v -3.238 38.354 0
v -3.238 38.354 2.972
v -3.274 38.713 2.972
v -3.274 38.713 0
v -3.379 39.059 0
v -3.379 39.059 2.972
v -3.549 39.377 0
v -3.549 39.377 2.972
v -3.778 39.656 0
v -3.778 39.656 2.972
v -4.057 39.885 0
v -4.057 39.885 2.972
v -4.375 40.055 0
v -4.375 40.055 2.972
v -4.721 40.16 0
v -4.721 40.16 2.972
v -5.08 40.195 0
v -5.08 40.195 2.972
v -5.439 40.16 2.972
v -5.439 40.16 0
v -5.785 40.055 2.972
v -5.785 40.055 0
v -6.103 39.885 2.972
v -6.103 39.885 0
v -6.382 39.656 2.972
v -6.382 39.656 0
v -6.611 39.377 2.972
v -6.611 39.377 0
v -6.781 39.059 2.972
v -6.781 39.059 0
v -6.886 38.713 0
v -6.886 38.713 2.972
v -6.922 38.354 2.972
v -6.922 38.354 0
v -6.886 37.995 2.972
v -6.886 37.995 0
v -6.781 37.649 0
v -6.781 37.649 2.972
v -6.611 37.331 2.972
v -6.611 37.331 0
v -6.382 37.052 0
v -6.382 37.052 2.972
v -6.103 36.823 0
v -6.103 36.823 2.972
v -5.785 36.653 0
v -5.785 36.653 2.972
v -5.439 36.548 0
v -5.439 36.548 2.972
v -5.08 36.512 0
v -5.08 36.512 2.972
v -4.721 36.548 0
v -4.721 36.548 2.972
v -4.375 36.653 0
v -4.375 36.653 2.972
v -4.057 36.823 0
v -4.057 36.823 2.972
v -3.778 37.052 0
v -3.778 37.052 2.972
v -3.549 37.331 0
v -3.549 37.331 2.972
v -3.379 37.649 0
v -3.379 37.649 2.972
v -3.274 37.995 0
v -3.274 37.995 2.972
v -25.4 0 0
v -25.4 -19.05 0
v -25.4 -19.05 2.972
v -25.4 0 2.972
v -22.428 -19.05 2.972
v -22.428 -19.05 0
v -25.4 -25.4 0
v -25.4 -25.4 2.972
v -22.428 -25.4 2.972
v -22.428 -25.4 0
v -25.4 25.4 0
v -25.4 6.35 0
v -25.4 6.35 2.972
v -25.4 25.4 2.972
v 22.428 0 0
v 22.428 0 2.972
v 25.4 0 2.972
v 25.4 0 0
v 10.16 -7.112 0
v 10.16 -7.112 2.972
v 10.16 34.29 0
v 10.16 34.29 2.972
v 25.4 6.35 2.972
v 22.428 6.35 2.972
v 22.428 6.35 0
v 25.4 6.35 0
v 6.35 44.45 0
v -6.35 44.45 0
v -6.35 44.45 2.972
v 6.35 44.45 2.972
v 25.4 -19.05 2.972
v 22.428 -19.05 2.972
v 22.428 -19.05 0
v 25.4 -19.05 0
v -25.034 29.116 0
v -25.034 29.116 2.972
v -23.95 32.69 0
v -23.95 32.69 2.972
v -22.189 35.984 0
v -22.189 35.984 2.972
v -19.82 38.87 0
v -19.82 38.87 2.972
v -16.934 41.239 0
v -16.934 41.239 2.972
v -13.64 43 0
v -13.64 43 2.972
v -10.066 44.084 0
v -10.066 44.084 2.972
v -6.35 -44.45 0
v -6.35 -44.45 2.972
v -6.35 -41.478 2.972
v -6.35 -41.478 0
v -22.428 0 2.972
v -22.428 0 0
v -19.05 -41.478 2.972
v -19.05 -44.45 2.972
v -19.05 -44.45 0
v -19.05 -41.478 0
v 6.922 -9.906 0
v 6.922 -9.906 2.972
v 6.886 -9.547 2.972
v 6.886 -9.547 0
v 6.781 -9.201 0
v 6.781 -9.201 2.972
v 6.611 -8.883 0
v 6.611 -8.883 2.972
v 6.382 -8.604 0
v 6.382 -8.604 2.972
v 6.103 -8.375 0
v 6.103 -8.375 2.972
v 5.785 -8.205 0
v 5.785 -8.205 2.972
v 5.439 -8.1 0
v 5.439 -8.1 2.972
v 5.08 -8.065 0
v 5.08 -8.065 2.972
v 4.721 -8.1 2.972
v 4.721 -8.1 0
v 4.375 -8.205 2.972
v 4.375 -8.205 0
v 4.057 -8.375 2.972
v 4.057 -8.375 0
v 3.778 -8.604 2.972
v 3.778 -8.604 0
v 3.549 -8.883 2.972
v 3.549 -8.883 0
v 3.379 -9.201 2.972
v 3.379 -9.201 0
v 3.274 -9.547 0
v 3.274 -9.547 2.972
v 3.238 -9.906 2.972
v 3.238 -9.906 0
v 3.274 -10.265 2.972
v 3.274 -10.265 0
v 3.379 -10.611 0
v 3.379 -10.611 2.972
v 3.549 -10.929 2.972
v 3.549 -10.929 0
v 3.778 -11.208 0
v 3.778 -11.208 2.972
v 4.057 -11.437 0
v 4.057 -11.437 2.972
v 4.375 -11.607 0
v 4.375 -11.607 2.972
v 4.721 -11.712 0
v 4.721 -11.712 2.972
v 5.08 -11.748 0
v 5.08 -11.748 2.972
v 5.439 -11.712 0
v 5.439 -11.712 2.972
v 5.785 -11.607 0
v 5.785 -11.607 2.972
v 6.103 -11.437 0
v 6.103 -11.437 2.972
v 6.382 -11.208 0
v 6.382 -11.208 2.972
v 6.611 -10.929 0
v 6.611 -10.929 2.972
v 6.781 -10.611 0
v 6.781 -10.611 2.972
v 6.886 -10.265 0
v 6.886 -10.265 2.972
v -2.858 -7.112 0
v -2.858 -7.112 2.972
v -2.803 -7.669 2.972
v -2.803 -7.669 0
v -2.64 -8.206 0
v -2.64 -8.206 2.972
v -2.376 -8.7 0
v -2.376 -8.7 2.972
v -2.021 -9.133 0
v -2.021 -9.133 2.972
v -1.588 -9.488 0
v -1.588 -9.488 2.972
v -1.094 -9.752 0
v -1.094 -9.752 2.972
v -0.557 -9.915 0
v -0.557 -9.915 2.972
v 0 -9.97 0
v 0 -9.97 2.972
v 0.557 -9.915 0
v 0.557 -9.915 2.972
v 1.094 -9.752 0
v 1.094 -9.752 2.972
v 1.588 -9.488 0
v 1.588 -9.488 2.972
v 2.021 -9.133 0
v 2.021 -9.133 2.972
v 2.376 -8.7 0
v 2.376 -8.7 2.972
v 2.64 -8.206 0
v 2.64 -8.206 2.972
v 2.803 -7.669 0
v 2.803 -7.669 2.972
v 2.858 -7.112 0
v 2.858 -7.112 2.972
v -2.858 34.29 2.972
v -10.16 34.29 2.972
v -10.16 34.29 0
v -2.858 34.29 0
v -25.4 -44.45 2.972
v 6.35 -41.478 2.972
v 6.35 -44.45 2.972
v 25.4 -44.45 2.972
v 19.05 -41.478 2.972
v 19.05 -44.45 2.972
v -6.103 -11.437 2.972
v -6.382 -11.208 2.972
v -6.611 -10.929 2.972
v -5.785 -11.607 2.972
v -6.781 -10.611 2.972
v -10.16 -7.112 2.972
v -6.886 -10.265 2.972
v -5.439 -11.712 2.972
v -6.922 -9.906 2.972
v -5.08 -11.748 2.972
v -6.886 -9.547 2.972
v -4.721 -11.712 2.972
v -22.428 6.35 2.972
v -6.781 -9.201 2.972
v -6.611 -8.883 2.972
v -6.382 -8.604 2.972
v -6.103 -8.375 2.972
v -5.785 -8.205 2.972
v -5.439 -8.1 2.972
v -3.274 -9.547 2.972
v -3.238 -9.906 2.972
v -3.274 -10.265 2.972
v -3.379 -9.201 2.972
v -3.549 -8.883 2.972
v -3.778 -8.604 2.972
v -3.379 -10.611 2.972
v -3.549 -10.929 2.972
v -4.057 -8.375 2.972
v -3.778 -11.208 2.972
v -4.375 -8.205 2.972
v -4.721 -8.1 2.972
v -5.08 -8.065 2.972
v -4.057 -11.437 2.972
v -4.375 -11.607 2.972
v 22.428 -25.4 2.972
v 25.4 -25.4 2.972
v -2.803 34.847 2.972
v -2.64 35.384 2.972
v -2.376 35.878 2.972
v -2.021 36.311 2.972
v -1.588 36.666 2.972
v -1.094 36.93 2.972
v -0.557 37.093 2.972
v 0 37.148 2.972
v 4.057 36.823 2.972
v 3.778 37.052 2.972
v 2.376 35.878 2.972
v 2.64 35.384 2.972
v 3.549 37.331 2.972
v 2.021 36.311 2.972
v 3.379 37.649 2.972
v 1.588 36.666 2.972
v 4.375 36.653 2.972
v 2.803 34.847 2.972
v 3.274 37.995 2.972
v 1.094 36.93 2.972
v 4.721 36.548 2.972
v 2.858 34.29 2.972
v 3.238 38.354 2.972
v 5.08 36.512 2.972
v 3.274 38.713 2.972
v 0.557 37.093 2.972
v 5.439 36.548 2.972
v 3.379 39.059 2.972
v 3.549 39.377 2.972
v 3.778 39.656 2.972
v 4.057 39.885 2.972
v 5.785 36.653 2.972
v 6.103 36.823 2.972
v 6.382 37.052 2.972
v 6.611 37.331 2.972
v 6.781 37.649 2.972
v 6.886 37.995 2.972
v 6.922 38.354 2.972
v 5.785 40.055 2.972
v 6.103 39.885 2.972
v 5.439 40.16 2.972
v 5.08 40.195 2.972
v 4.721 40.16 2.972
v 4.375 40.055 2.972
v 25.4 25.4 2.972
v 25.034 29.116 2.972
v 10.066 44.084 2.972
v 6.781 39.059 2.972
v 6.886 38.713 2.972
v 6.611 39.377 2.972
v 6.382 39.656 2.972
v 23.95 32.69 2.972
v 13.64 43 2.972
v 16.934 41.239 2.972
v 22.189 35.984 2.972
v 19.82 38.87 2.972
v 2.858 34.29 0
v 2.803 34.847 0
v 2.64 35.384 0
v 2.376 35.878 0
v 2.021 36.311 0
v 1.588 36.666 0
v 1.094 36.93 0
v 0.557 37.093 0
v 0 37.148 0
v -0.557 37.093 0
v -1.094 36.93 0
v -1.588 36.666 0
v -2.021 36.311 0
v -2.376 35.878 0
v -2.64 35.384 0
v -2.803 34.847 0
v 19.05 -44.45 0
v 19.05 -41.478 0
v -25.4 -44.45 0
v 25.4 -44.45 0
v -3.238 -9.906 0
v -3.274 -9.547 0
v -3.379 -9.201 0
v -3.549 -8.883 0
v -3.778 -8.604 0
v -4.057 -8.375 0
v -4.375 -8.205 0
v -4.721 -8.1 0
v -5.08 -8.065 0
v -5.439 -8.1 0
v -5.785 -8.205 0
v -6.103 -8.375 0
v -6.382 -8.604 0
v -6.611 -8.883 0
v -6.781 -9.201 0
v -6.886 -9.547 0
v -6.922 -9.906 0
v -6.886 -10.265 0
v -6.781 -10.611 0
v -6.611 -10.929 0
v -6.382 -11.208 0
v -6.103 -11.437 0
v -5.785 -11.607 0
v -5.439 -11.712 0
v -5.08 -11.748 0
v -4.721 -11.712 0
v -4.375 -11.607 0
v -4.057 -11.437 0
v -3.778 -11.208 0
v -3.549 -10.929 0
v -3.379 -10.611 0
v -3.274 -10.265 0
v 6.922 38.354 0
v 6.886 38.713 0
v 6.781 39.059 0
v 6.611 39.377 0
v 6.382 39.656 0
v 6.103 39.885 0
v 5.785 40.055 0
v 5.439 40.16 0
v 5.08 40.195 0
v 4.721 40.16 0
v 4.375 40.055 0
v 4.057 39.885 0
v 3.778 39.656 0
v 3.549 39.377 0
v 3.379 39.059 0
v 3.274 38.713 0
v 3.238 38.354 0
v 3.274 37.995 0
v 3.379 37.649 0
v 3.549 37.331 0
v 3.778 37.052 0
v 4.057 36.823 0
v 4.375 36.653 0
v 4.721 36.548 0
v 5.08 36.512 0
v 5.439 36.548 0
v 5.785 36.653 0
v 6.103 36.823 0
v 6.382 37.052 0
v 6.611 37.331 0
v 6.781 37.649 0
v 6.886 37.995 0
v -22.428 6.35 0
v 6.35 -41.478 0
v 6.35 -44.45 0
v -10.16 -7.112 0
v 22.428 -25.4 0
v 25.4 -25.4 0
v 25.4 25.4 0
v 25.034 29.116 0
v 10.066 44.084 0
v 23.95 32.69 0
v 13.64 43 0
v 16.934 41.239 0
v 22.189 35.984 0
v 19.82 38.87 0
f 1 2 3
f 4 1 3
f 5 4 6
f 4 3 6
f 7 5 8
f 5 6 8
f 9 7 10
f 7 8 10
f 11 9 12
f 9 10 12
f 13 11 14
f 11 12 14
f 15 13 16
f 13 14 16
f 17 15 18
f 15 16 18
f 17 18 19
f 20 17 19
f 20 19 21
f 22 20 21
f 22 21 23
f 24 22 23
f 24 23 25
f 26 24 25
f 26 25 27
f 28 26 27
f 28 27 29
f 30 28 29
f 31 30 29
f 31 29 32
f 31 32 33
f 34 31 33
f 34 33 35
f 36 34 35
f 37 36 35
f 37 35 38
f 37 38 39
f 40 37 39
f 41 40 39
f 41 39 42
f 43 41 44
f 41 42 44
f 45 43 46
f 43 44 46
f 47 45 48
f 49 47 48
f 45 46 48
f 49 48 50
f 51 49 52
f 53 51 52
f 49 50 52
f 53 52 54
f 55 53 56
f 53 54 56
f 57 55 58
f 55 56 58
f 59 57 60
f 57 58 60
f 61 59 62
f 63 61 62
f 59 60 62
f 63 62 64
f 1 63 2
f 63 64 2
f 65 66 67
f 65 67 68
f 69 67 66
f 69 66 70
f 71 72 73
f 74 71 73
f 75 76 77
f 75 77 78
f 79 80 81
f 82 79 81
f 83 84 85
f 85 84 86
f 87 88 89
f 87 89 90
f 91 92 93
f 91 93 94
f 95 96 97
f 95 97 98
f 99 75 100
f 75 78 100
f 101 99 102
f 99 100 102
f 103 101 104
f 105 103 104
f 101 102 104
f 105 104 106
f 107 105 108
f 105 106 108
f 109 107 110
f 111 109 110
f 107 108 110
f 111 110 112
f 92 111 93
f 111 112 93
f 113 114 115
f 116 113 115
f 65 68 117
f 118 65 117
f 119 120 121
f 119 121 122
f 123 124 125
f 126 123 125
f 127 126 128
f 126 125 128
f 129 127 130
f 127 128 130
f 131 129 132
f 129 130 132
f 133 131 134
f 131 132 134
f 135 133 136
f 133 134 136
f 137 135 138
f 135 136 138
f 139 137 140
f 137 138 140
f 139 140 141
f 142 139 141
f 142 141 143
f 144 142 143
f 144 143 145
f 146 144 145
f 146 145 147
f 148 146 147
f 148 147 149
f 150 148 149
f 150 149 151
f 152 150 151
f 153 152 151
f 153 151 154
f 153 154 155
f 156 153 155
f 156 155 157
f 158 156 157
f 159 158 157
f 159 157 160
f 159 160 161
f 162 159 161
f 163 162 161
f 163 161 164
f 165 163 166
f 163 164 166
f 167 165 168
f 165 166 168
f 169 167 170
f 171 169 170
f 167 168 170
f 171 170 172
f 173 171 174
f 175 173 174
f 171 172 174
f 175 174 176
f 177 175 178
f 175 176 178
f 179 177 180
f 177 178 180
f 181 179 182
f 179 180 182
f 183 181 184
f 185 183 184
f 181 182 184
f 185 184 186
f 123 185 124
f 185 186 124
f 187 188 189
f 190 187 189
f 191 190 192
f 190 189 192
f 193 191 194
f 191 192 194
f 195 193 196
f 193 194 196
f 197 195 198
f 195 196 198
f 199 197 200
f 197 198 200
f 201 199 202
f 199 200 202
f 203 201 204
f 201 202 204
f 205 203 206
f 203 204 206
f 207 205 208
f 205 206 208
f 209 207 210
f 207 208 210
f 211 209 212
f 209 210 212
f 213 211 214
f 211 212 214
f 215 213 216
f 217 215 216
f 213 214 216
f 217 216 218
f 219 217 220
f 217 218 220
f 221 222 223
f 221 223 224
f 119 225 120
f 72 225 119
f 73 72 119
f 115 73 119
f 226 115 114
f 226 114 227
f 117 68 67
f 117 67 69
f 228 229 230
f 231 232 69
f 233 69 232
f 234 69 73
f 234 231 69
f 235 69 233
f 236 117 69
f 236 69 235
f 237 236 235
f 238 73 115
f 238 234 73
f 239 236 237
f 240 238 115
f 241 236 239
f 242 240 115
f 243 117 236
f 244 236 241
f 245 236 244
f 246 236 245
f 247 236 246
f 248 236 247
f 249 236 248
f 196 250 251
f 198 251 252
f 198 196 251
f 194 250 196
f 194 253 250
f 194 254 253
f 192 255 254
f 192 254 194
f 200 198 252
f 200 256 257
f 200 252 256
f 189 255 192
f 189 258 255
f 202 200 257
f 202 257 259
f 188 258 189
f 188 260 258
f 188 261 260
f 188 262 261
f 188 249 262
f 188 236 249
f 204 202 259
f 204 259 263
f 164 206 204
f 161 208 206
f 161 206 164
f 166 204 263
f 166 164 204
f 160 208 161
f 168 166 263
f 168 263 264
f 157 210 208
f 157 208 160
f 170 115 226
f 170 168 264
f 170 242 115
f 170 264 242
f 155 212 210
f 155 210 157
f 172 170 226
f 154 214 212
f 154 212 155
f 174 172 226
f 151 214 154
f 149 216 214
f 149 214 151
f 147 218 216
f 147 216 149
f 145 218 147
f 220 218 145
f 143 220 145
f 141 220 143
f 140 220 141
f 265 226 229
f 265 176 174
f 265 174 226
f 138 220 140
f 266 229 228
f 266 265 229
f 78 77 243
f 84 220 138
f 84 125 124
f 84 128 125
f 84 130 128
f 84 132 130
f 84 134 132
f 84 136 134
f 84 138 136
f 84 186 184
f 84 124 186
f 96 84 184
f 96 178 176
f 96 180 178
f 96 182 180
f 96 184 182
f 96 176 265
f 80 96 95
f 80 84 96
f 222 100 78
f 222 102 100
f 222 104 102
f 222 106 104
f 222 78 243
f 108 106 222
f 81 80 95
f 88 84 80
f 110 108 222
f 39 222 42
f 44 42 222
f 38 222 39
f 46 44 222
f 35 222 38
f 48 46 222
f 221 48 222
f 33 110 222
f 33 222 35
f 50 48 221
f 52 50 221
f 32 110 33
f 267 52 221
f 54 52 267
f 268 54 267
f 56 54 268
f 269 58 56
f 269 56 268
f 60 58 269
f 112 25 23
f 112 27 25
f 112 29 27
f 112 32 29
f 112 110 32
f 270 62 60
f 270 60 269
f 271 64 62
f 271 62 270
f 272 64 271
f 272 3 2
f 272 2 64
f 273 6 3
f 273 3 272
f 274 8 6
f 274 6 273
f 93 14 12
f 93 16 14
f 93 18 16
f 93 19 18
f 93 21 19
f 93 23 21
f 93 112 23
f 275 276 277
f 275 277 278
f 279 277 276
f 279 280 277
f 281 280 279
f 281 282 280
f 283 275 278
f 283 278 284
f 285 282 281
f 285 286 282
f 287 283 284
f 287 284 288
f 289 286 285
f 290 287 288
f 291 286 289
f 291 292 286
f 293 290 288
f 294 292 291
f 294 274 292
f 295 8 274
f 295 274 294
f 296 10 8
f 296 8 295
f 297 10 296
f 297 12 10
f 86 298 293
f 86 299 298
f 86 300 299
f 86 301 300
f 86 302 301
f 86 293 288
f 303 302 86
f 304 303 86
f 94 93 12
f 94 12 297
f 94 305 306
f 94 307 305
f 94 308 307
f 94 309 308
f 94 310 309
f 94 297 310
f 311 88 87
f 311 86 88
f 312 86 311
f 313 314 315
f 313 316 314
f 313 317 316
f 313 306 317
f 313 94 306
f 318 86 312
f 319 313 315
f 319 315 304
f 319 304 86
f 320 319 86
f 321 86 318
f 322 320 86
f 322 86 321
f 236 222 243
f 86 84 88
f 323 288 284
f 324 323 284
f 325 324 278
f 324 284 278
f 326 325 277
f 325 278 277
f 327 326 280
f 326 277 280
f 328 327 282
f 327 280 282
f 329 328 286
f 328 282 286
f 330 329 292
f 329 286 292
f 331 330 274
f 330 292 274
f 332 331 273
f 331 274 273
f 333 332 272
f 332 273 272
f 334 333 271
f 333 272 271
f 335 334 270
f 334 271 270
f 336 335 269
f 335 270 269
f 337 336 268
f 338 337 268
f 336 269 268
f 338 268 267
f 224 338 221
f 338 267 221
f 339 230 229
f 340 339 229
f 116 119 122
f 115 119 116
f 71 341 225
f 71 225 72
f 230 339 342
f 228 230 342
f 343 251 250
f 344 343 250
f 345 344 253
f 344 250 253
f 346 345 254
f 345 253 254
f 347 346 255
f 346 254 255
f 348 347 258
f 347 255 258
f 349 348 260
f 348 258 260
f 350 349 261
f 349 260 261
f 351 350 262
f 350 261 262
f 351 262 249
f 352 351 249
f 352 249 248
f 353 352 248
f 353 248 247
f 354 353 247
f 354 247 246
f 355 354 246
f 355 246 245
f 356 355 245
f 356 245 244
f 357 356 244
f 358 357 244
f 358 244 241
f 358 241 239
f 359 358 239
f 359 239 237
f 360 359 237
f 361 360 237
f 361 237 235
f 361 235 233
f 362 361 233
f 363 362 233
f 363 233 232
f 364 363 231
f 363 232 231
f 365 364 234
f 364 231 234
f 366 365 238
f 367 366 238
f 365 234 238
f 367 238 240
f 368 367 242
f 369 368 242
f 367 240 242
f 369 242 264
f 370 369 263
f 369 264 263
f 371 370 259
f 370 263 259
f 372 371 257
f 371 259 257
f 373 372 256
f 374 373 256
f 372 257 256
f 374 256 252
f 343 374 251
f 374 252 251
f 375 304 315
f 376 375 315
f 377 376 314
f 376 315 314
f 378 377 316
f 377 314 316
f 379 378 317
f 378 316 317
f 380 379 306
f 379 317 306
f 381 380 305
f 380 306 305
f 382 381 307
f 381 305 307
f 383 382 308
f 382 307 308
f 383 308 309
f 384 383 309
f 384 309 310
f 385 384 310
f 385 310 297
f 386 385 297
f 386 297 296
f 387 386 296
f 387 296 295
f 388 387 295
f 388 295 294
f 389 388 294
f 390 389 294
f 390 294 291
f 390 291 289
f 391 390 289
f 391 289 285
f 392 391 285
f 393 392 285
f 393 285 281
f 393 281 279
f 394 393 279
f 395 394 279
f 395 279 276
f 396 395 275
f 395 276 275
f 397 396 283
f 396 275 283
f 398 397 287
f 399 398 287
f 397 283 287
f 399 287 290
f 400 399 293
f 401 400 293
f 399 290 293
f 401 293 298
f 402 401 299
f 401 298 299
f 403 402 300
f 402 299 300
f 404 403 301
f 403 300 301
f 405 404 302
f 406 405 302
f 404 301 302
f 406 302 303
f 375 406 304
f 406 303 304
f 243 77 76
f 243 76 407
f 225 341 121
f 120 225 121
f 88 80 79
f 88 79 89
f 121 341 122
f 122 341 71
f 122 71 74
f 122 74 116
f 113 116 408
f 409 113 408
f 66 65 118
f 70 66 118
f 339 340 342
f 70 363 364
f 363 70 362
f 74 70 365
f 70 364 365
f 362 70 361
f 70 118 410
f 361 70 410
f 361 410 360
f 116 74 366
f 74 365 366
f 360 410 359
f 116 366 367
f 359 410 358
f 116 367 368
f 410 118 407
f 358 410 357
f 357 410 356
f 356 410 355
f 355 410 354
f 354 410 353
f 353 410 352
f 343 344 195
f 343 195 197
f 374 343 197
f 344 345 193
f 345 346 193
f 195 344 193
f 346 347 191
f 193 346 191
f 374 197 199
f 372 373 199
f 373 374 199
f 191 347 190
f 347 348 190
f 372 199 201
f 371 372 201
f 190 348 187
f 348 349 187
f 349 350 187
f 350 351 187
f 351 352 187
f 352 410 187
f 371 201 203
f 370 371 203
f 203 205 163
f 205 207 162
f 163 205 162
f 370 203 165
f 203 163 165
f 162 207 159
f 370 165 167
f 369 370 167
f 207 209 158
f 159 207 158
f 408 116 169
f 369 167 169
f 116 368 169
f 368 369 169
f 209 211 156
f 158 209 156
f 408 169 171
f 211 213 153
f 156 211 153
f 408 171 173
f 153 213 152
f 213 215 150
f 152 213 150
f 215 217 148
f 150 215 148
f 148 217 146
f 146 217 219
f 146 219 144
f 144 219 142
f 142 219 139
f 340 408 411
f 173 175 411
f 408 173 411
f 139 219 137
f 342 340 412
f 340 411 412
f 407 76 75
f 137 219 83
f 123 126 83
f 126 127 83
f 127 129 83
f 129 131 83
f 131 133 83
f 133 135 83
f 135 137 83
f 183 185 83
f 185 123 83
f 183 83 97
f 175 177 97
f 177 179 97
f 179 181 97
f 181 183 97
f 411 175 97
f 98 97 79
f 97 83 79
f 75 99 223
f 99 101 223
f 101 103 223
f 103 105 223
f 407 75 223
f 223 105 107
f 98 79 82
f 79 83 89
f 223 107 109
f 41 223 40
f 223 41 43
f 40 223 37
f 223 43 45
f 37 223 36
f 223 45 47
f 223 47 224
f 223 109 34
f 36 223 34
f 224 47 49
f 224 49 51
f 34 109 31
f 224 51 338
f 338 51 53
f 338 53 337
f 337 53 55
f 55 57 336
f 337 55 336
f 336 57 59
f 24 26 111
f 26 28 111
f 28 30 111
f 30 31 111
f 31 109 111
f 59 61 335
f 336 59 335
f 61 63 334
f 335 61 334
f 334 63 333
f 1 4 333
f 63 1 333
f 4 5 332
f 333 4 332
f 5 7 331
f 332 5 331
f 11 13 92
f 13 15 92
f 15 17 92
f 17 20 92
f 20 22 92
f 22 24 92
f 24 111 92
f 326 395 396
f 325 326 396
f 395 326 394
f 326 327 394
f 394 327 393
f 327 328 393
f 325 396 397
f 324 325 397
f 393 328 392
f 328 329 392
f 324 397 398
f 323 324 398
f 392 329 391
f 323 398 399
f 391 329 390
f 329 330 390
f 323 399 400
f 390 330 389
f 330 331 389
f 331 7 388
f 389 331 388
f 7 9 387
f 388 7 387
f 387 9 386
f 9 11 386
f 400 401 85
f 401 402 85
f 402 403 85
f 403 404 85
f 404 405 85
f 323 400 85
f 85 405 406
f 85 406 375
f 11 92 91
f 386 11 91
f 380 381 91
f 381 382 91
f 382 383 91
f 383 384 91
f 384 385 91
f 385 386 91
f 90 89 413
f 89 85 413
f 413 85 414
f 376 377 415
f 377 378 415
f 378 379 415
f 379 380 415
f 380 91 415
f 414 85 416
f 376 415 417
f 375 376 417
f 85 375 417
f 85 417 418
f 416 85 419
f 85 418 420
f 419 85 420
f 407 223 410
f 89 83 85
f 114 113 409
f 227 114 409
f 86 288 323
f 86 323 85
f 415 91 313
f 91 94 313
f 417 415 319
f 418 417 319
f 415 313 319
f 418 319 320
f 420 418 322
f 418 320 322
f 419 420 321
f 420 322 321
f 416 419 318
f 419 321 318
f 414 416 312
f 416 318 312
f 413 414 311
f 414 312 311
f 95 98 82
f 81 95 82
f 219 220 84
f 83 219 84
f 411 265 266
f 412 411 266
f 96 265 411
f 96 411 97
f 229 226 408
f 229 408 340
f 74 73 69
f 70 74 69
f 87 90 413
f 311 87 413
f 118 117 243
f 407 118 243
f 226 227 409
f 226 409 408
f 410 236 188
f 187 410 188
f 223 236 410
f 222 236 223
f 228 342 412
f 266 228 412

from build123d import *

# Parameters (mm, degrees)
F0_W      = 50.8
F0_H      = 88.9
F1_DEPTH  = 2.9718
F2_W      = 20.32
F2_H      = 41.402
F3_DEPTH  = 25.4
F4_W      = 12.7
F4_H      = 2.9718
F5_DEPTH  = 25.4
F6_W      = 2.9718
F6_H      = 6.35
F7_DEPTH  = 25.4
F8_R      = 1.8415
F9_DEPTH  = 25.4
F11_DEPTH = 25.4
F12_R     = 19.05


with BuildPart() as f1:
    # F0 (on Top) → F1 (new body)
    with BuildSketch(Plane.XY):
        Rectangle(F0_W, F0_H)
    extrude(amount=F1_DEPTH)

    # F2 (on face) → F3 (cut)
    with BuildSketch(Plane.XY.offset(2.9718)):
        with Locations((0, 13.589)):
            Rectangle(F2_W, F2_H)
    extrude(amount=-F3_DEPTH, mode=Mode.SUBTRACT)

    # F4 (on face) → F5 (cut)
    with BuildSketch(Plane.XY.offset(2.9718)):
        with Locations((-12.7, -42.9641)):
            Rectangle(F4_W, F4_H)
        with Locations((12.7, -42.9641)):
            Rectangle(F4_W, F4_H)
    extrude(amount=-F5_DEPTH, mode=Mode.SUBTRACT)

    # F6 (on face) → F7 (cut)
    with BuildSketch(Plane.XY.offset(2.9718)):
        with Locations((23.9141, 3.175)):
            Rectangle(F6_W, F6_H)
        with Locations((-23.9141, 3.175)):
            Rectangle(F6_W, F6_H)
        with Locations((-23.9141, -22.225)):
            Rectangle(F6_W, F6_H)
        with Locations((23.9141, -22.225)):
            Rectangle(F6_W, F6_H)
    extrude(amount=-F7_DEPTH, mode=Mode.SUBTRACT)

    # F8 (on face) → F9 (cut)
    with BuildSketch(Plane.XY.offset(2.9718)):
        with Locations((-5.08, 38.354)):
            Circle(F8_R)
        with Locations((5.08, 38.354)):
            Circle(F8_R)
        with Locations((-5.08, -9.906)):
            Circle(F8_R)
        with Locations((5.08, -9.906)):
            Circle(F8_R)
    extrude(amount=-F9_DEPTH, mode=Mode.SUBTRACT)

    # F10 (on face) → F11 (cut)
    with BuildSketch(Plane.XY.offset(2.9718)):
        with BuildLine():
            ThreePointArc((2.8575, 34.29), (0, 37.1475), (-2.8575, 34.29))
            Line((-2.8575, 34.29), (2.8575, 34.29))
        make_face()
        with BuildLine():
            ThreePointArc((-2.8575, -7.112), (0, -9.9695), (2.8575, -7.112))
            Line((2.8575, -7.112), (-2.8575, -7.112))
        make_face()
    extrude(amount=-F11_DEPTH, mode=Mode.SUBTRACT)

    # F12
    f12_edges = [f1.edges().sort_by_distance(p)[0] for p in [
        (25.4, 44.45, 1.4859),
        (-25.4, 44.45, 1.4859),
    ]]
    fillet(f12_edges, radius=F12_R)


solid = f1.part
